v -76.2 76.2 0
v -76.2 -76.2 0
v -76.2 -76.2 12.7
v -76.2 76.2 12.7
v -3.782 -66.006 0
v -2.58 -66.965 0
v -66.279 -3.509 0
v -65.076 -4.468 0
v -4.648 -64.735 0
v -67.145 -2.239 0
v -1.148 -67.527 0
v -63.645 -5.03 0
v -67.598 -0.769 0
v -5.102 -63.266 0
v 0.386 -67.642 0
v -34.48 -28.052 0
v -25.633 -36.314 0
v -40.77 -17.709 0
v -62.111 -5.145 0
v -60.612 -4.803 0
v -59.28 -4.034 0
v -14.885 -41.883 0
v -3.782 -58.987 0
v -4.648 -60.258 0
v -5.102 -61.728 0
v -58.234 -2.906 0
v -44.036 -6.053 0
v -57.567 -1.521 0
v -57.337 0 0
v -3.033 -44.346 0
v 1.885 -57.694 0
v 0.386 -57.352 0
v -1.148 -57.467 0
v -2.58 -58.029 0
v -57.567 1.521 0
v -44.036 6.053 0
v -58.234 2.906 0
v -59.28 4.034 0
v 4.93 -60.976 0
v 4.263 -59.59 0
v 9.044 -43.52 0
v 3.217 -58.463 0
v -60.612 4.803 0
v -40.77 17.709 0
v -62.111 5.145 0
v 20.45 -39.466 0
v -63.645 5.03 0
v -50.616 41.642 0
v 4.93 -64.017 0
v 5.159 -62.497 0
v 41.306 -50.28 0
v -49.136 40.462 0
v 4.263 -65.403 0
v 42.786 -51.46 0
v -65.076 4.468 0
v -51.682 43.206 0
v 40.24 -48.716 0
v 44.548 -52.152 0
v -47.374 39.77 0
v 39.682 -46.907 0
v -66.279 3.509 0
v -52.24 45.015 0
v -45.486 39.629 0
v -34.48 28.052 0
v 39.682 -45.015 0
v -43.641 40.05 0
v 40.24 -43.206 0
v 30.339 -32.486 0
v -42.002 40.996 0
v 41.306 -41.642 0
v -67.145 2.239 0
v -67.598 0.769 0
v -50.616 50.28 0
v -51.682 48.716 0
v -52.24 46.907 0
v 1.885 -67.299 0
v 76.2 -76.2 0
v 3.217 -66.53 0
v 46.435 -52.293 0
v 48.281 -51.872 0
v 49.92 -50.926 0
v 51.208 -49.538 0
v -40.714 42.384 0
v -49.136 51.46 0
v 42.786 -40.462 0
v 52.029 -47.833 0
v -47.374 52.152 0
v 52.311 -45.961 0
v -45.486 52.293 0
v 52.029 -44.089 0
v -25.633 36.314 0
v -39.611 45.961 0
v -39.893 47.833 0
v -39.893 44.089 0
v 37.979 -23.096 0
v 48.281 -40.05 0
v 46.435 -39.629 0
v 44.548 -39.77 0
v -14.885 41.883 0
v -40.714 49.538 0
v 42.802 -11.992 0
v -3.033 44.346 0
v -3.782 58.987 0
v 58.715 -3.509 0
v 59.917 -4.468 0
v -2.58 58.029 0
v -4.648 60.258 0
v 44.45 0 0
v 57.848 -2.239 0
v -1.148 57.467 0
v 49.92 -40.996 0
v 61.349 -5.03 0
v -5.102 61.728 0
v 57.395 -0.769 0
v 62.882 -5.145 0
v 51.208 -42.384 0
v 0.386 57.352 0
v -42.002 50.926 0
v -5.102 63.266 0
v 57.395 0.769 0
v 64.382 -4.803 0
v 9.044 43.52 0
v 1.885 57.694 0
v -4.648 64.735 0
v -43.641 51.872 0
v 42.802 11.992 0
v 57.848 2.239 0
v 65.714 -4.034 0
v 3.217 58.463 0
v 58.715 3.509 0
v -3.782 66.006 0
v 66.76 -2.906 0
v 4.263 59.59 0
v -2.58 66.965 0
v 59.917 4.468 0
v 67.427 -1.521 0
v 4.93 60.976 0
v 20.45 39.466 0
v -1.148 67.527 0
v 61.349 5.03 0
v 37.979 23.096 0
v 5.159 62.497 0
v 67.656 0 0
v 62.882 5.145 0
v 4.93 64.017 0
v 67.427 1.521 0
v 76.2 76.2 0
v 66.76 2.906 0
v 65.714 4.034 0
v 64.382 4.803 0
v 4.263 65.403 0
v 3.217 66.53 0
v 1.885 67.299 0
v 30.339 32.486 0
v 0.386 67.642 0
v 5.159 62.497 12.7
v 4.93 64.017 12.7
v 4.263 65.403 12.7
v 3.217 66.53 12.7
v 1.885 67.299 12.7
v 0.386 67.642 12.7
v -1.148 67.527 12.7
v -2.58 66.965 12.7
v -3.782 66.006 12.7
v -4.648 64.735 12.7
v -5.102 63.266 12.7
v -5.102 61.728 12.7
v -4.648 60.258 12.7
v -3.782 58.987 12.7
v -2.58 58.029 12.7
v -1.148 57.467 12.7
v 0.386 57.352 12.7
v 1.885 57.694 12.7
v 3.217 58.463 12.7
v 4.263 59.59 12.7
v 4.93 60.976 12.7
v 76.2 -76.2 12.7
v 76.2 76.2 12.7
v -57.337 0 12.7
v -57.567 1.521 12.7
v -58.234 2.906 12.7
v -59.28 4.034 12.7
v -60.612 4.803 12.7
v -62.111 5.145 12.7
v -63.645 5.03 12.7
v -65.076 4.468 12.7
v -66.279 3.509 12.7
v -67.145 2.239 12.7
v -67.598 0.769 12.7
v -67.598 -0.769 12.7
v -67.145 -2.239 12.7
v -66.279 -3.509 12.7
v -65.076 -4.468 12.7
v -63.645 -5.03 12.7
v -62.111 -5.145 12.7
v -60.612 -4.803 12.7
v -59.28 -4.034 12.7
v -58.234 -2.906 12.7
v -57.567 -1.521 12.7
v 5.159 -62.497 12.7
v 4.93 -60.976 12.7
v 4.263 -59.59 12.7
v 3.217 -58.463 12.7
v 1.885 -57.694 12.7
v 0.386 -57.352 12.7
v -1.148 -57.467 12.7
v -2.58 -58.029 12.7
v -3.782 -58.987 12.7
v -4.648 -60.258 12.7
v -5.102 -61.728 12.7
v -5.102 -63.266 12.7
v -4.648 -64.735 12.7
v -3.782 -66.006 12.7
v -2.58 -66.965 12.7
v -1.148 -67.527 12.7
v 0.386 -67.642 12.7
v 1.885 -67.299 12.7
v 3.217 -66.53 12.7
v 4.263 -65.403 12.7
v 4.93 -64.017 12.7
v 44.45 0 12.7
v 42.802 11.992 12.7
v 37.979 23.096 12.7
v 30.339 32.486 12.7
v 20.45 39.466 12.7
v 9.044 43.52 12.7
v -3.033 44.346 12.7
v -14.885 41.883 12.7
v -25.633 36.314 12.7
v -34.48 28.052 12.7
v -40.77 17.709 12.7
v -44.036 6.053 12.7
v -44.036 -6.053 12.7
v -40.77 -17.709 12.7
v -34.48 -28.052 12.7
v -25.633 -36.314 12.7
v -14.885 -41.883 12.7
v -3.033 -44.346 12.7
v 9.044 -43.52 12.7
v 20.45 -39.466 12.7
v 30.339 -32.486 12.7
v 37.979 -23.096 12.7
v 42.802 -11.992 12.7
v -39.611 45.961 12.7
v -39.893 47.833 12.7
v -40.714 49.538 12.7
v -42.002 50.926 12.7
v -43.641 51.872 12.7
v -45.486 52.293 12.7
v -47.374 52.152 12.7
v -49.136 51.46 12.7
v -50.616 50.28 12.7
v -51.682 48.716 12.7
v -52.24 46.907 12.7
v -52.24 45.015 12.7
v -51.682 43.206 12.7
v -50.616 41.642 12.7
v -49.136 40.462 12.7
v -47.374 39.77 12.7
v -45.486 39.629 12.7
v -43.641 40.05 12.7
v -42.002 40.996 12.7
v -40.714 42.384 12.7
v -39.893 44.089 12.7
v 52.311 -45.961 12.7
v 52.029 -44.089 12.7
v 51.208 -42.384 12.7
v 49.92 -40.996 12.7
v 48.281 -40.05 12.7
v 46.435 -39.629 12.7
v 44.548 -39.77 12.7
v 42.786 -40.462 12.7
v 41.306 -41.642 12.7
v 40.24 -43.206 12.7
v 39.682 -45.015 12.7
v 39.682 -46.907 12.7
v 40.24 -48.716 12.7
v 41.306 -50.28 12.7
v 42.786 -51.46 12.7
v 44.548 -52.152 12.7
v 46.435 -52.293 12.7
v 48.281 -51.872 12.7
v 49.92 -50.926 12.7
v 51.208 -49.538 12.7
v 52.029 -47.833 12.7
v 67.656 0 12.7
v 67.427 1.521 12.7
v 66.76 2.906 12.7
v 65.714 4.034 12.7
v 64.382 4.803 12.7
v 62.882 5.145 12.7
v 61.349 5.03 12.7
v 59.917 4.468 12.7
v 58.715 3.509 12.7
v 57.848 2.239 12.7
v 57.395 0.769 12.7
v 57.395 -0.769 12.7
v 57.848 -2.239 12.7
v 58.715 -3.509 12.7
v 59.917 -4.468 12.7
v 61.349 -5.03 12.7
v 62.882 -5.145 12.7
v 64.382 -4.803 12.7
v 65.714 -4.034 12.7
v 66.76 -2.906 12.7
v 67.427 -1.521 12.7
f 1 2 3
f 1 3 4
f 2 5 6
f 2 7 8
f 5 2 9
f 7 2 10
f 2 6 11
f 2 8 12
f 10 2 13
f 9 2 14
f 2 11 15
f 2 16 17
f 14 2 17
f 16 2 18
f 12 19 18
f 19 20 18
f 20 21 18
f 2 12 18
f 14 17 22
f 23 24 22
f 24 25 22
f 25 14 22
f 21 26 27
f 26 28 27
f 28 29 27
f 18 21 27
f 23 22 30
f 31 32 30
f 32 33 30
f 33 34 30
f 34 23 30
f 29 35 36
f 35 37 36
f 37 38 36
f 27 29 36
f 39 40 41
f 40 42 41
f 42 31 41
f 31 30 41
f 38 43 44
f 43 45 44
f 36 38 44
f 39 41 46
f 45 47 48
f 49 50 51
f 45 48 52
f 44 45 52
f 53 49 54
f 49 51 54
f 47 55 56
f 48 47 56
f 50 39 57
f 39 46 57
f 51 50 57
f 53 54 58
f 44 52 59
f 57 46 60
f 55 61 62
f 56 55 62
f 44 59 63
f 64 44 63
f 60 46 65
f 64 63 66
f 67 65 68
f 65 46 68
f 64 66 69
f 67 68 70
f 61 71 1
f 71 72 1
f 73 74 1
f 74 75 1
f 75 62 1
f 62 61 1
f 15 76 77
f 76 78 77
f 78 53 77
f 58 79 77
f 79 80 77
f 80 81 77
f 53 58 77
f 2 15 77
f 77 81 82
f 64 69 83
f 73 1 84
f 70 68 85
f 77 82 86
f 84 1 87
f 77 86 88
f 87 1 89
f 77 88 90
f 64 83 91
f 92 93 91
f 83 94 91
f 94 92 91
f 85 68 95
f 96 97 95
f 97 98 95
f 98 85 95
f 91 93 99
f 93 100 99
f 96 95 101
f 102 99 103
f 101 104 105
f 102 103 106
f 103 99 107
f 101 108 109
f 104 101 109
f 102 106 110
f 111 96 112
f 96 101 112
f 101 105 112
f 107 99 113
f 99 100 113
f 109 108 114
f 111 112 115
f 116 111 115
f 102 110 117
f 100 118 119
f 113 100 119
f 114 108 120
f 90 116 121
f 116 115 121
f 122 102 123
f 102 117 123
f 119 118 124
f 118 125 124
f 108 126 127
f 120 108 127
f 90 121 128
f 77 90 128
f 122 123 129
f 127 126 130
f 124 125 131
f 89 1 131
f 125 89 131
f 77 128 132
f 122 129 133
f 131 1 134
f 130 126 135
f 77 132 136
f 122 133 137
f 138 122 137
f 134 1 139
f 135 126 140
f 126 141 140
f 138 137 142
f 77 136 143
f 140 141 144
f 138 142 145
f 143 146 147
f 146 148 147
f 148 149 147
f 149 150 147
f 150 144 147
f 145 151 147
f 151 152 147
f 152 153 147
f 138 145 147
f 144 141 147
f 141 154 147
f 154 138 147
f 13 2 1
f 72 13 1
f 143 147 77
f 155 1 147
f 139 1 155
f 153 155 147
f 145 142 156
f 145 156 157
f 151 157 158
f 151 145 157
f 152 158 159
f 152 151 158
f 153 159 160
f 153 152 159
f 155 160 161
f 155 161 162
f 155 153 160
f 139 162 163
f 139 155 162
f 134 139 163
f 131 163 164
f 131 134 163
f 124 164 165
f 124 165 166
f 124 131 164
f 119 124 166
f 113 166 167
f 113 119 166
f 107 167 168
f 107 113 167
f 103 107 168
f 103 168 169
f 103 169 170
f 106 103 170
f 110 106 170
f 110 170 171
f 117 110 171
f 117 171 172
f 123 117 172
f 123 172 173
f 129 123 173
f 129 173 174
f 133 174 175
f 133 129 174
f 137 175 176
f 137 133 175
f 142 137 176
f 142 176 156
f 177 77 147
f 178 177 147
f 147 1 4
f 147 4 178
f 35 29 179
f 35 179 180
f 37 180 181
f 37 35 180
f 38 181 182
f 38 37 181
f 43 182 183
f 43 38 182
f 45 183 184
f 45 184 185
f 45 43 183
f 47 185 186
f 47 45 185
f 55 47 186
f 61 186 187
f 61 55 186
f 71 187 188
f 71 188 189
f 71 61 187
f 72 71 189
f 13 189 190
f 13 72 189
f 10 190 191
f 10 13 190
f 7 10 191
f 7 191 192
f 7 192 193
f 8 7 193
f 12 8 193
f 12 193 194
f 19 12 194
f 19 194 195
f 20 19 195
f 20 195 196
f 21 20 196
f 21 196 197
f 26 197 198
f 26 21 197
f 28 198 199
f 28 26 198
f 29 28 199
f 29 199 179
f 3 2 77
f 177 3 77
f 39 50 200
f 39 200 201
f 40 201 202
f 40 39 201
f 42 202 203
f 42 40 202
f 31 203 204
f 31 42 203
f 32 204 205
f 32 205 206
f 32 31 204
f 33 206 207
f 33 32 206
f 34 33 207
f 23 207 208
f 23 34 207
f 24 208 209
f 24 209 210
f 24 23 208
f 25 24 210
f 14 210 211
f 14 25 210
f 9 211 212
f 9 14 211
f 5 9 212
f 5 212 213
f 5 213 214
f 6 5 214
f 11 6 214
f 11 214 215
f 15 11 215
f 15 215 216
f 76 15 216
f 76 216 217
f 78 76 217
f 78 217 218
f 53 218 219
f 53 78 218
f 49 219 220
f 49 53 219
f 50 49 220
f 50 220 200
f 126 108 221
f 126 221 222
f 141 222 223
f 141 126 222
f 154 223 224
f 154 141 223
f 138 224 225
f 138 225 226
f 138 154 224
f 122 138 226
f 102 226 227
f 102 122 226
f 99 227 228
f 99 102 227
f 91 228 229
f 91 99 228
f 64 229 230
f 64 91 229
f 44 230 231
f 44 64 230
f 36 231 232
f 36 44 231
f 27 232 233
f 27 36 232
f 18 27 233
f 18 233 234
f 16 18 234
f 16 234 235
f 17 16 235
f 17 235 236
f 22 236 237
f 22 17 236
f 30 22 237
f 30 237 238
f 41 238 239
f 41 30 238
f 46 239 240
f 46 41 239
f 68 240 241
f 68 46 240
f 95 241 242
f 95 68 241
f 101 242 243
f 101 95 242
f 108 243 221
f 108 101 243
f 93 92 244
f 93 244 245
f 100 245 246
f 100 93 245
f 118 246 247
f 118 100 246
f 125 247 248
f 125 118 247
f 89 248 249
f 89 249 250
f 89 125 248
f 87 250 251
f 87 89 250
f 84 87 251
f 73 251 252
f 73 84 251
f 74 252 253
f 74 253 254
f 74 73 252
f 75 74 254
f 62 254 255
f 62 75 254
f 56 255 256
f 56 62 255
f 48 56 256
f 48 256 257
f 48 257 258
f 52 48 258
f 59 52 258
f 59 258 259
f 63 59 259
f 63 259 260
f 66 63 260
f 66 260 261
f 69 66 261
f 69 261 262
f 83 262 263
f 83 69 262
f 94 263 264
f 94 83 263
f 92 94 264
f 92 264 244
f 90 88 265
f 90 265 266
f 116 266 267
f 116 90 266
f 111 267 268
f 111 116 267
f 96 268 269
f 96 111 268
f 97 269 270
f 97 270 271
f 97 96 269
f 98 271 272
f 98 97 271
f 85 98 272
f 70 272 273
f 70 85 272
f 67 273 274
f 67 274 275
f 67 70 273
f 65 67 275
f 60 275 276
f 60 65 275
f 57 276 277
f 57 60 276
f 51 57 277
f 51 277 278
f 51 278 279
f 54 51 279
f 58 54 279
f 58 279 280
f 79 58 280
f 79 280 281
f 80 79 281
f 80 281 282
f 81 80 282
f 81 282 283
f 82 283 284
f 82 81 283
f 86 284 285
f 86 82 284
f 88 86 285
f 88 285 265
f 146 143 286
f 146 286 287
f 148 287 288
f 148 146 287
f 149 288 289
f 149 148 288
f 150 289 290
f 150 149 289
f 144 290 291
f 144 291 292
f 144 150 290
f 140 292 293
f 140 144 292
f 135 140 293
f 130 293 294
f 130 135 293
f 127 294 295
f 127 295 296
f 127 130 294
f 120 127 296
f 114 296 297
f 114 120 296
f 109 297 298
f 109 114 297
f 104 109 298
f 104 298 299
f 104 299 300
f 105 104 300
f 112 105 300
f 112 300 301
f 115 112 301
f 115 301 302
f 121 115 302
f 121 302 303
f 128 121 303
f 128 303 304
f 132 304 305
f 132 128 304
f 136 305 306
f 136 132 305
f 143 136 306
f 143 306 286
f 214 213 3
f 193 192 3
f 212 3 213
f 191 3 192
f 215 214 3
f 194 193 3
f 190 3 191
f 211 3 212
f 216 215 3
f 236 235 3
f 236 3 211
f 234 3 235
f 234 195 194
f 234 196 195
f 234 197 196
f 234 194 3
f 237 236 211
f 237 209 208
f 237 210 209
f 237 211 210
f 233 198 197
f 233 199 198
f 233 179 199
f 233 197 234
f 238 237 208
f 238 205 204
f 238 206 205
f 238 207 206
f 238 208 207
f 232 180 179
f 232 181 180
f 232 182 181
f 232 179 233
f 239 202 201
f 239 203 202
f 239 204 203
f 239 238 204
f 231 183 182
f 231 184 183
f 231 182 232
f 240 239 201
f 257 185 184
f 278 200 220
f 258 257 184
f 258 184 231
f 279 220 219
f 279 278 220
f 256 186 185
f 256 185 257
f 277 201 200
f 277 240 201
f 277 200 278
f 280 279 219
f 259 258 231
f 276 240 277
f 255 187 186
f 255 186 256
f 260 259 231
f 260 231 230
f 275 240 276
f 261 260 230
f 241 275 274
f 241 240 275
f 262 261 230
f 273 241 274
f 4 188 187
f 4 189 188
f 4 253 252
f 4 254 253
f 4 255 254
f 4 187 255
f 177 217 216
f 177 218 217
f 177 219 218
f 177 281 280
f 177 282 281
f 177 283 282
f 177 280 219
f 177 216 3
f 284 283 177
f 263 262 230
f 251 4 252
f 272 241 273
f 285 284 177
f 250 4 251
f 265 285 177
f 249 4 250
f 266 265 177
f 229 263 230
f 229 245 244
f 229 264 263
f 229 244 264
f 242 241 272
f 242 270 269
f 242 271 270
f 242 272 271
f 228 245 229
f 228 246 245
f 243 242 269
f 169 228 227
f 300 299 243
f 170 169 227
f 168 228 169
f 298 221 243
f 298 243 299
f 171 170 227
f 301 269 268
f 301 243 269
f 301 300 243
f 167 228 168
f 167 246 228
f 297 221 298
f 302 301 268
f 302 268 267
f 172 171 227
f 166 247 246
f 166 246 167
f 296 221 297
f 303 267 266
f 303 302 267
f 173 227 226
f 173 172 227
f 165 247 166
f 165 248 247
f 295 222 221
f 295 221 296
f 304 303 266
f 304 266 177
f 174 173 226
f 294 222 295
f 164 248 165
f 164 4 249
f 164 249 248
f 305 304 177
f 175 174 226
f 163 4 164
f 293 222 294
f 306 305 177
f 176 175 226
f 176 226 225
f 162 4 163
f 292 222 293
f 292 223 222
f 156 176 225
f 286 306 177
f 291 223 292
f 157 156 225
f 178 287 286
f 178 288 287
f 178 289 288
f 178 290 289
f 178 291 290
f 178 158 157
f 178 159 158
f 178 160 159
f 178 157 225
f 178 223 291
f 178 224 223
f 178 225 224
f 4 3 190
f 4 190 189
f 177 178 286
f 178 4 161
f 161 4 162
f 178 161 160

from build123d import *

# Parameters (mm, degrees)
F0_W     = 152.4
F0_H     = 152.4
F0_R     = 5.159375
F0_R_2   = 6.35
F0_R_3   = 44.45
F1_DEPTH = 12.7


with BuildPart() as f1:
    # F0 (on Top) → F1 (new body)
    with BuildSketch(Plane.XY):
        Rectangle(F0_W, F0_H)
        with Locations((0, -62.4967)):
            Circle(F0_R, mode=Mode.SUBTRACT)
        with Locations((45.960951, -45.960951)):
            Circle(F0_R_2, mode=Mode.SUBTRACT)
        with Locations((-62.4967, 0)):
            Circle(F0_R, mode=Mode.SUBTRACT)
        with Locations((-45.960951, 45.960951)):
            Circle(F0_R_2, mode=Mode.SUBTRACT)
        Circle(F0_R_3, mode=Mode.SUBTRACT)
        with Locations((62.4967, 0)):
            Circle(F0_R, mode=Mode.SUBTRACT)
        with Locations((0, 62.4967)):
            Circle(F0_R, mode=Mode.SUBTRACT)
    extrude(amount=F1_DEPTH)


solid = f1.part
